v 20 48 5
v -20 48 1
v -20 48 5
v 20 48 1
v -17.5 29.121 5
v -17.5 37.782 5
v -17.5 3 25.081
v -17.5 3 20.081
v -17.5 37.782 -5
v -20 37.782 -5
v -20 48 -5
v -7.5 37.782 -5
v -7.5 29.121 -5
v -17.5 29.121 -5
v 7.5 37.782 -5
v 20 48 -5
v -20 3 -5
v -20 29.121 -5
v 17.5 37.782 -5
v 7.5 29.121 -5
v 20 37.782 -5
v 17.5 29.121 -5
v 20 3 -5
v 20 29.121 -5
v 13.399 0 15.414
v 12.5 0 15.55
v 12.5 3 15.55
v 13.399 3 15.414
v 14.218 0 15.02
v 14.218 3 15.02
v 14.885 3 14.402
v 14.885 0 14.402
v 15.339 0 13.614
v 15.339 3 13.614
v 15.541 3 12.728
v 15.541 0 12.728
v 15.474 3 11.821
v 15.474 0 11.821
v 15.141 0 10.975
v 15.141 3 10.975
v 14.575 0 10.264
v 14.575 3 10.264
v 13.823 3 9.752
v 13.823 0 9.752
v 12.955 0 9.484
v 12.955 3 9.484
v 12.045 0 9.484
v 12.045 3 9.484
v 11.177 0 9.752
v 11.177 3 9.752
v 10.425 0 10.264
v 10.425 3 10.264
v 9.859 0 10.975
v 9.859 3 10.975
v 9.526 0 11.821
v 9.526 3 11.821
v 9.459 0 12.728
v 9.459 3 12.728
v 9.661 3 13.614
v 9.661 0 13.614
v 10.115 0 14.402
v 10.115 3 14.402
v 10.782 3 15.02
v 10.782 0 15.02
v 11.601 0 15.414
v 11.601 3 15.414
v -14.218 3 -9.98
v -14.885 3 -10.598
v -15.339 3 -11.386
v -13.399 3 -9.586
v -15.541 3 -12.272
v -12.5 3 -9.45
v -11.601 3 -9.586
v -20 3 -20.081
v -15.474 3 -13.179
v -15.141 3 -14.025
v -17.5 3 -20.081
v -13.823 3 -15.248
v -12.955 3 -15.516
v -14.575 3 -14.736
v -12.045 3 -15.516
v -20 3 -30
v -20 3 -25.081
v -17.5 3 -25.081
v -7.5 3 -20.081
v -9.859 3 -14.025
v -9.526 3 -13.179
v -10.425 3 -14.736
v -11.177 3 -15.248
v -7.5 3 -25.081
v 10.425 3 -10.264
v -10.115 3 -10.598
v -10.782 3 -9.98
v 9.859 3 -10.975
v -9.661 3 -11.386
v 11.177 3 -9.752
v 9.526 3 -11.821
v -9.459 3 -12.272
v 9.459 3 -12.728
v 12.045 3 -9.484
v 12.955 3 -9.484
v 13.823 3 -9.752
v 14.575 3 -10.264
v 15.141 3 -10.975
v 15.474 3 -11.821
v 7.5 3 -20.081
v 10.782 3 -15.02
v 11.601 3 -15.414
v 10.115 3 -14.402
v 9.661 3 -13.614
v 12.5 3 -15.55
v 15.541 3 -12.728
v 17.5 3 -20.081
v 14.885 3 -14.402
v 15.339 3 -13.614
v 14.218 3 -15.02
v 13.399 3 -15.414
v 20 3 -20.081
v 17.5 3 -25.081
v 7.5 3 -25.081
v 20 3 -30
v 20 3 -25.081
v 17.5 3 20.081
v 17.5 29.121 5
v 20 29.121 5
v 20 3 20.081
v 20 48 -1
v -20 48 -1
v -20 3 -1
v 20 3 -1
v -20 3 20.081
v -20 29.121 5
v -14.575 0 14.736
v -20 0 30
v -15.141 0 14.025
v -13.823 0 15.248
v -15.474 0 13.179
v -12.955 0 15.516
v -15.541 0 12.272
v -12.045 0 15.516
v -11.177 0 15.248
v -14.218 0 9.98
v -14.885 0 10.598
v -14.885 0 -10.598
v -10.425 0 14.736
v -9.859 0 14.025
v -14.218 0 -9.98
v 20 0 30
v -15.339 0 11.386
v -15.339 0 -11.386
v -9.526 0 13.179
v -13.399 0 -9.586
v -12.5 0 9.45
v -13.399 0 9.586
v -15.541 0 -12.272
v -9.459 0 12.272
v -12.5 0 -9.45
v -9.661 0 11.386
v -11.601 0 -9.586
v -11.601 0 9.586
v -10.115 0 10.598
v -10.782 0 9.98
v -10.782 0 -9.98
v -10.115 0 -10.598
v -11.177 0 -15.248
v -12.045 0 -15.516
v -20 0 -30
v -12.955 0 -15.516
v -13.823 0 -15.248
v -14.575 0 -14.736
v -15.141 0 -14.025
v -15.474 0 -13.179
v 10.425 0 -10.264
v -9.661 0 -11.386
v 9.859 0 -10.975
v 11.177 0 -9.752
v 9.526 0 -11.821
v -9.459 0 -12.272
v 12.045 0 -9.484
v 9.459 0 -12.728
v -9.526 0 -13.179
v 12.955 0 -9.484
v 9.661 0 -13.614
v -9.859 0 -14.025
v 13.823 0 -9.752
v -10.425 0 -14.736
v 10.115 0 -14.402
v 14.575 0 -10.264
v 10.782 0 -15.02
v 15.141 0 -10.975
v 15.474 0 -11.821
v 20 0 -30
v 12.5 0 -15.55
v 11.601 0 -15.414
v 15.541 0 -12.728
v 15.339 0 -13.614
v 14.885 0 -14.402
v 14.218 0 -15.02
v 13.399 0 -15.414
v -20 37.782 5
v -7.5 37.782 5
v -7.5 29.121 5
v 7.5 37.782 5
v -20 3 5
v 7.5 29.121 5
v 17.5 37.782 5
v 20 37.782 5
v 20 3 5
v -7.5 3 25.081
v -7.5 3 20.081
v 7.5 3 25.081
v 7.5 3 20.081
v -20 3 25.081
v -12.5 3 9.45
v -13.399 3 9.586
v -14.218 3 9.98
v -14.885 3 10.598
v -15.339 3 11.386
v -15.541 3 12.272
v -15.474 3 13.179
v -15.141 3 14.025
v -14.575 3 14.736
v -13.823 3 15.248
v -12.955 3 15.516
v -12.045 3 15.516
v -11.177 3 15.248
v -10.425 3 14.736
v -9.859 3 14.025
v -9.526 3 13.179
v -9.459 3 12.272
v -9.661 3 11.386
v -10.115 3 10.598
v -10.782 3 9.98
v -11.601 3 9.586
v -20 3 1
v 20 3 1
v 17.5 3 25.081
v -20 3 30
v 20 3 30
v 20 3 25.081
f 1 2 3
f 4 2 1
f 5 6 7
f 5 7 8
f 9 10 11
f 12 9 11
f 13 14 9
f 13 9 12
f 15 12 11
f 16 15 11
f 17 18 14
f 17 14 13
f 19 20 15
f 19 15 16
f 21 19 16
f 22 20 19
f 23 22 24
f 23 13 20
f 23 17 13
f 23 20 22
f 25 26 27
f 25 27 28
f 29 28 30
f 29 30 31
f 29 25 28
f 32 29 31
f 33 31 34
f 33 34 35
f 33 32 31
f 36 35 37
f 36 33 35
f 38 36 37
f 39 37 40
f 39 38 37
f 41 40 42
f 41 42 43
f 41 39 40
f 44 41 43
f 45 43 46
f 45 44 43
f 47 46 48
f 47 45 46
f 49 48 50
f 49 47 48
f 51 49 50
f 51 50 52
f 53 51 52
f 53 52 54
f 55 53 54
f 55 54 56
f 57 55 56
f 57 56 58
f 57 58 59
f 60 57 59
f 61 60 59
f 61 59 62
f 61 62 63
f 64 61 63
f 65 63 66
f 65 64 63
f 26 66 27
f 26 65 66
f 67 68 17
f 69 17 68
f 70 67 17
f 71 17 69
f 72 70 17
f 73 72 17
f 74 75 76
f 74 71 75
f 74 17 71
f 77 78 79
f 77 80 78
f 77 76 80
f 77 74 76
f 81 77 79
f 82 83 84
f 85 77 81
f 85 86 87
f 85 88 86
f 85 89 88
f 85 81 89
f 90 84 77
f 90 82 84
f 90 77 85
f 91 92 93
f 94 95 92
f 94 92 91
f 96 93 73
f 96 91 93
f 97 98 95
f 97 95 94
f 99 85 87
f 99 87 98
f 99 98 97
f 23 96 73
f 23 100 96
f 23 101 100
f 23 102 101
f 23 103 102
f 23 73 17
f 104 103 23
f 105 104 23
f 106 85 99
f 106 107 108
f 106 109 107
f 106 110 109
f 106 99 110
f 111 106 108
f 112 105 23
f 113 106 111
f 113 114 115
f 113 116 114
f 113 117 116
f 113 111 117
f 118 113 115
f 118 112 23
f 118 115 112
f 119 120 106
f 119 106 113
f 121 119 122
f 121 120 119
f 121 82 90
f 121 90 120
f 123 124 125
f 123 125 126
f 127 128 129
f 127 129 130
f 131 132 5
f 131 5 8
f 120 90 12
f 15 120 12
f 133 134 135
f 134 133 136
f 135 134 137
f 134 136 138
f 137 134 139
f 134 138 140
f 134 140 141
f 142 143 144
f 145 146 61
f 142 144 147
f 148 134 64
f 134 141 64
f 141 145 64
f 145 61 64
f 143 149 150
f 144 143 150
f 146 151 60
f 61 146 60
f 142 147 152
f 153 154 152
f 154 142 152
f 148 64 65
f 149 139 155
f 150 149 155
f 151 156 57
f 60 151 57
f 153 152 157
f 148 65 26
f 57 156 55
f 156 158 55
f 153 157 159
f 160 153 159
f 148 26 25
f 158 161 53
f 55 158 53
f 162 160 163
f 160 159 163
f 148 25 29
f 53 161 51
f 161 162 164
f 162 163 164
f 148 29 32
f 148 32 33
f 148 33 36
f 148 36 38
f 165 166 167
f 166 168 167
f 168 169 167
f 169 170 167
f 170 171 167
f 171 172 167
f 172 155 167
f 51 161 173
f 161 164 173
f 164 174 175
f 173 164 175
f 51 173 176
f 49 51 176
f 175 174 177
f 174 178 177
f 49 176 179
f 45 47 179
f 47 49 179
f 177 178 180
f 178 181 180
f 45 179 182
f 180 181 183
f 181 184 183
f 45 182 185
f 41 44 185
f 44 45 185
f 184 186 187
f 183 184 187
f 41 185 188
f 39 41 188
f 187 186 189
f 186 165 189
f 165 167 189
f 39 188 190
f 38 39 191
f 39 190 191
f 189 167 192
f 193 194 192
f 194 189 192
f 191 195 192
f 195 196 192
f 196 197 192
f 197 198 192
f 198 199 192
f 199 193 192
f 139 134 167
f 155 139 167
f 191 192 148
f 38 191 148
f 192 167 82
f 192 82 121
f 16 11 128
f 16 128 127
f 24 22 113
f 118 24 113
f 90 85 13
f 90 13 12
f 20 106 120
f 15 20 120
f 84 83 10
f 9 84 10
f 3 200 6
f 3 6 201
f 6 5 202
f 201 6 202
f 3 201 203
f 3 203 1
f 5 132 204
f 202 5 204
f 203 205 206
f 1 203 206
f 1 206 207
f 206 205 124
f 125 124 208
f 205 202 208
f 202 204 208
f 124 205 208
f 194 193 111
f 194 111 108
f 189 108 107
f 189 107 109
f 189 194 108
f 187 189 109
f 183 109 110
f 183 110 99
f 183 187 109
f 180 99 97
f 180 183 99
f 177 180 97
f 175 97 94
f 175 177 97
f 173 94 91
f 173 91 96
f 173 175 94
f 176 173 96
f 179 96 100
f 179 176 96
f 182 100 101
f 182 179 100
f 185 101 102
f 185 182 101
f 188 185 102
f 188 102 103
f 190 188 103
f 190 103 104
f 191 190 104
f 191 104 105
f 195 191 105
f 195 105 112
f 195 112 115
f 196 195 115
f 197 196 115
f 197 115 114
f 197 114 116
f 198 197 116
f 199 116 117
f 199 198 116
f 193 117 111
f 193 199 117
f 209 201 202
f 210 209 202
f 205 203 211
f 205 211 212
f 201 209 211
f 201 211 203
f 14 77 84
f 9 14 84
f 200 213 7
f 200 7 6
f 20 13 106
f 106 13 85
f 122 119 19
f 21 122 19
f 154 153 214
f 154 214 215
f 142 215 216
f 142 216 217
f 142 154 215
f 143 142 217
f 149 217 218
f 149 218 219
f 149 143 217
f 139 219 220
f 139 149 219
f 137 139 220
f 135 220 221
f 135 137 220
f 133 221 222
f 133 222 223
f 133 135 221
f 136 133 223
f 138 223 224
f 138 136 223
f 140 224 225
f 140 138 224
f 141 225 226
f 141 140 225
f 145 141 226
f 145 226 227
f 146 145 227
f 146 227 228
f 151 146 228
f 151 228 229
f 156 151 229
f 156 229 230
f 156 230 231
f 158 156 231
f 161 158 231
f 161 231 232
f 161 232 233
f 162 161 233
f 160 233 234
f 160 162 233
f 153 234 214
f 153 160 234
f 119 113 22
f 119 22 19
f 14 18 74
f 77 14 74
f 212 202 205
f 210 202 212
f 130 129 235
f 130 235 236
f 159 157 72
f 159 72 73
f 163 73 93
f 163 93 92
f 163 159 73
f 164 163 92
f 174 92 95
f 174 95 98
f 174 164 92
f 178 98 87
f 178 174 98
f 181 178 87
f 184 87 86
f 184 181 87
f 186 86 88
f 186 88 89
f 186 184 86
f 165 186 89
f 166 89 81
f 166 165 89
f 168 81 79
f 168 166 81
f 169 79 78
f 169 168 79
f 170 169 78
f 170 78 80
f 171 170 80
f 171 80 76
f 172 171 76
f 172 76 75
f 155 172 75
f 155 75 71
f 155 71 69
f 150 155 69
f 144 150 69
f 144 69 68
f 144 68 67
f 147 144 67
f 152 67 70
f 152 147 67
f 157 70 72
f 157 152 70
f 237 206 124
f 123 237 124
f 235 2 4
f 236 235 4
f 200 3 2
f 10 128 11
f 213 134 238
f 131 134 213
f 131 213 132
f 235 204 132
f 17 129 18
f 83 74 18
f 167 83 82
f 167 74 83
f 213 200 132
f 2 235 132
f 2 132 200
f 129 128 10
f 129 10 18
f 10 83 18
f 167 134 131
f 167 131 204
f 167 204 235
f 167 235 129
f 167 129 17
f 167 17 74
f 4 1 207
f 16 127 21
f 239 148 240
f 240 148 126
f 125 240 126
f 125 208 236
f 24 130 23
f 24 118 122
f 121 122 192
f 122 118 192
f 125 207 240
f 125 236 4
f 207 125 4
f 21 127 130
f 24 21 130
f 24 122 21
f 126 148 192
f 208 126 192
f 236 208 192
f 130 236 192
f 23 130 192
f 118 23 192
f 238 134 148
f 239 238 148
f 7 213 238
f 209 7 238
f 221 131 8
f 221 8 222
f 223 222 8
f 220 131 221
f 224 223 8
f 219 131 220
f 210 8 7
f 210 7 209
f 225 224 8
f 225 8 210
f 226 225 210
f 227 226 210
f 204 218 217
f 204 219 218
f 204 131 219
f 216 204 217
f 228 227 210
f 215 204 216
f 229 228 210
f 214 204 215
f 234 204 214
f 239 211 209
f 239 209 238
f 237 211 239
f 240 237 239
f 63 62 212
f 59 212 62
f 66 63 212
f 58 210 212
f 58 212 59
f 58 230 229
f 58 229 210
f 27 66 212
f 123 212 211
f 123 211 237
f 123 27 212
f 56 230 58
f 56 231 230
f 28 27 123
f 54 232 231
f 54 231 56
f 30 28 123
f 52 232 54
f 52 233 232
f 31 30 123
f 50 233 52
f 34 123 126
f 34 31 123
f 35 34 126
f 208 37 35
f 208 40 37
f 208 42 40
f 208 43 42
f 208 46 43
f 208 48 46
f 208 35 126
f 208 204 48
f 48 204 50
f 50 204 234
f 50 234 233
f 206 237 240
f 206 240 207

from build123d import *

# Parameters (mm, degrees)
SKETCH_1_W           = 40
SKETCH_1_H           = 60
SKETCH_1_R           = 3.05
EXTRUDE_1_DEPTH      = 3
SKETCH_2_W           = 40
SKETCH_2_H           = 4
EXTRUDE_2_DEPTH      = 45
EXTRUDE_3_DEPTH      = 20
EXTRUDE_3_DEPTH_BACK = 20
SKETCH_4_W           = 10
SKETCH_4_H           = 20.081171456
CUT_EXTRUDE_1_DEPTH  = 58.662812973


with BuildPart() as part:
    # 草图1 → 凸台-拉伸1 (new body)
    with BuildSketch(Plane(origin=(0, 0, 0), x_dir=(1, 0, 0), z_dir=(0, 1, 0))):
        Rectangle(SKETCH_1_W, SKETCH_1_H)
        with Locations((-12.5, 12.5)):
            Circle(SKETCH_1_R, mode=Mode.SUBTRACT)
        with Locations((12.5, 12.5)):
            Circle(SKETCH_1_R, mode=Mode.SUBTRACT)
        with Locations((12.5, -12.5)):
            Circle(SKETCH_1_R, mode=Mode.SUBTRACT)
        with Locations((-12.5, -12.5)):
            Circle(SKETCH_1_R, mode=Mode.SUBTRACT)
    extrude(amount=EXTRUDE_1_DEPTH)

    # 草图2 → 凸台-拉伸2 (add)
    with BuildSketch(Plane(origin=(0, 3, 0), x_dir=(1, 0, 0), z_dir=(0, 1, 0))):
        with Locations((0, 3)):
            Rectangle(SKETCH_2_W, SKETCH_2_H)
        with Locations((0, -3)):
            Rectangle(SKETCH_2_W, SKETCH_2_H)
    extrude(amount=EXTRUDE_2_DEPTH)

    # 草图3 → 凸台-拉伸3 (add, two sides: drawn at the far end of the back side and taken through both)
    with BuildSketch(Plane(origin=(0, 0, 0), x_dir=(0, 0, -1), z_dir=(1, 0, 0)).offset(-EXTRUDE_3_DEPTH_BACK)):
        Polygon((-5, 29.121355199), (-20.081171456, 3), (-25.081171456, 3), (-5, 37.781609237), align=None)
        Polygon((5, 37.781609237), (5, 29.121355199), (20.081171456, 3), (25.081171456, 3), align=None)
    extrude(amount=EXTRUDE_3_DEPTH + EXTRUDE_3_DEPTH_BACK)

    # 草图4 → 切除-拉伸1 (cut, through all)
    with BuildSketch(Plane(origin=(0, 3, 0), x_dir=(1, 0, 0), z_dir=(0, 1, 0))):
        with Locations((12.5, 15.040585728)):
            Rectangle(SKETCH_4_W, SKETCH_4_H)
        with Locations((-12.5, 15.040585728)):
            Rectangle(SKETCH_4_W, SKETCH_4_H)
        with Locations((12.5, -15.040585728)):
            Rectangle(SKETCH_4_W, SKETCH_4_H)
        with Locations((-12.5, -15.040585728)):
            Rectangle(SKETCH_4_W, SKETCH_4_H)
    extrude(amount=CUT_EXTRUDE_1_DEPTH, mode=Mode.SUBTRACT)


solid = part.part
